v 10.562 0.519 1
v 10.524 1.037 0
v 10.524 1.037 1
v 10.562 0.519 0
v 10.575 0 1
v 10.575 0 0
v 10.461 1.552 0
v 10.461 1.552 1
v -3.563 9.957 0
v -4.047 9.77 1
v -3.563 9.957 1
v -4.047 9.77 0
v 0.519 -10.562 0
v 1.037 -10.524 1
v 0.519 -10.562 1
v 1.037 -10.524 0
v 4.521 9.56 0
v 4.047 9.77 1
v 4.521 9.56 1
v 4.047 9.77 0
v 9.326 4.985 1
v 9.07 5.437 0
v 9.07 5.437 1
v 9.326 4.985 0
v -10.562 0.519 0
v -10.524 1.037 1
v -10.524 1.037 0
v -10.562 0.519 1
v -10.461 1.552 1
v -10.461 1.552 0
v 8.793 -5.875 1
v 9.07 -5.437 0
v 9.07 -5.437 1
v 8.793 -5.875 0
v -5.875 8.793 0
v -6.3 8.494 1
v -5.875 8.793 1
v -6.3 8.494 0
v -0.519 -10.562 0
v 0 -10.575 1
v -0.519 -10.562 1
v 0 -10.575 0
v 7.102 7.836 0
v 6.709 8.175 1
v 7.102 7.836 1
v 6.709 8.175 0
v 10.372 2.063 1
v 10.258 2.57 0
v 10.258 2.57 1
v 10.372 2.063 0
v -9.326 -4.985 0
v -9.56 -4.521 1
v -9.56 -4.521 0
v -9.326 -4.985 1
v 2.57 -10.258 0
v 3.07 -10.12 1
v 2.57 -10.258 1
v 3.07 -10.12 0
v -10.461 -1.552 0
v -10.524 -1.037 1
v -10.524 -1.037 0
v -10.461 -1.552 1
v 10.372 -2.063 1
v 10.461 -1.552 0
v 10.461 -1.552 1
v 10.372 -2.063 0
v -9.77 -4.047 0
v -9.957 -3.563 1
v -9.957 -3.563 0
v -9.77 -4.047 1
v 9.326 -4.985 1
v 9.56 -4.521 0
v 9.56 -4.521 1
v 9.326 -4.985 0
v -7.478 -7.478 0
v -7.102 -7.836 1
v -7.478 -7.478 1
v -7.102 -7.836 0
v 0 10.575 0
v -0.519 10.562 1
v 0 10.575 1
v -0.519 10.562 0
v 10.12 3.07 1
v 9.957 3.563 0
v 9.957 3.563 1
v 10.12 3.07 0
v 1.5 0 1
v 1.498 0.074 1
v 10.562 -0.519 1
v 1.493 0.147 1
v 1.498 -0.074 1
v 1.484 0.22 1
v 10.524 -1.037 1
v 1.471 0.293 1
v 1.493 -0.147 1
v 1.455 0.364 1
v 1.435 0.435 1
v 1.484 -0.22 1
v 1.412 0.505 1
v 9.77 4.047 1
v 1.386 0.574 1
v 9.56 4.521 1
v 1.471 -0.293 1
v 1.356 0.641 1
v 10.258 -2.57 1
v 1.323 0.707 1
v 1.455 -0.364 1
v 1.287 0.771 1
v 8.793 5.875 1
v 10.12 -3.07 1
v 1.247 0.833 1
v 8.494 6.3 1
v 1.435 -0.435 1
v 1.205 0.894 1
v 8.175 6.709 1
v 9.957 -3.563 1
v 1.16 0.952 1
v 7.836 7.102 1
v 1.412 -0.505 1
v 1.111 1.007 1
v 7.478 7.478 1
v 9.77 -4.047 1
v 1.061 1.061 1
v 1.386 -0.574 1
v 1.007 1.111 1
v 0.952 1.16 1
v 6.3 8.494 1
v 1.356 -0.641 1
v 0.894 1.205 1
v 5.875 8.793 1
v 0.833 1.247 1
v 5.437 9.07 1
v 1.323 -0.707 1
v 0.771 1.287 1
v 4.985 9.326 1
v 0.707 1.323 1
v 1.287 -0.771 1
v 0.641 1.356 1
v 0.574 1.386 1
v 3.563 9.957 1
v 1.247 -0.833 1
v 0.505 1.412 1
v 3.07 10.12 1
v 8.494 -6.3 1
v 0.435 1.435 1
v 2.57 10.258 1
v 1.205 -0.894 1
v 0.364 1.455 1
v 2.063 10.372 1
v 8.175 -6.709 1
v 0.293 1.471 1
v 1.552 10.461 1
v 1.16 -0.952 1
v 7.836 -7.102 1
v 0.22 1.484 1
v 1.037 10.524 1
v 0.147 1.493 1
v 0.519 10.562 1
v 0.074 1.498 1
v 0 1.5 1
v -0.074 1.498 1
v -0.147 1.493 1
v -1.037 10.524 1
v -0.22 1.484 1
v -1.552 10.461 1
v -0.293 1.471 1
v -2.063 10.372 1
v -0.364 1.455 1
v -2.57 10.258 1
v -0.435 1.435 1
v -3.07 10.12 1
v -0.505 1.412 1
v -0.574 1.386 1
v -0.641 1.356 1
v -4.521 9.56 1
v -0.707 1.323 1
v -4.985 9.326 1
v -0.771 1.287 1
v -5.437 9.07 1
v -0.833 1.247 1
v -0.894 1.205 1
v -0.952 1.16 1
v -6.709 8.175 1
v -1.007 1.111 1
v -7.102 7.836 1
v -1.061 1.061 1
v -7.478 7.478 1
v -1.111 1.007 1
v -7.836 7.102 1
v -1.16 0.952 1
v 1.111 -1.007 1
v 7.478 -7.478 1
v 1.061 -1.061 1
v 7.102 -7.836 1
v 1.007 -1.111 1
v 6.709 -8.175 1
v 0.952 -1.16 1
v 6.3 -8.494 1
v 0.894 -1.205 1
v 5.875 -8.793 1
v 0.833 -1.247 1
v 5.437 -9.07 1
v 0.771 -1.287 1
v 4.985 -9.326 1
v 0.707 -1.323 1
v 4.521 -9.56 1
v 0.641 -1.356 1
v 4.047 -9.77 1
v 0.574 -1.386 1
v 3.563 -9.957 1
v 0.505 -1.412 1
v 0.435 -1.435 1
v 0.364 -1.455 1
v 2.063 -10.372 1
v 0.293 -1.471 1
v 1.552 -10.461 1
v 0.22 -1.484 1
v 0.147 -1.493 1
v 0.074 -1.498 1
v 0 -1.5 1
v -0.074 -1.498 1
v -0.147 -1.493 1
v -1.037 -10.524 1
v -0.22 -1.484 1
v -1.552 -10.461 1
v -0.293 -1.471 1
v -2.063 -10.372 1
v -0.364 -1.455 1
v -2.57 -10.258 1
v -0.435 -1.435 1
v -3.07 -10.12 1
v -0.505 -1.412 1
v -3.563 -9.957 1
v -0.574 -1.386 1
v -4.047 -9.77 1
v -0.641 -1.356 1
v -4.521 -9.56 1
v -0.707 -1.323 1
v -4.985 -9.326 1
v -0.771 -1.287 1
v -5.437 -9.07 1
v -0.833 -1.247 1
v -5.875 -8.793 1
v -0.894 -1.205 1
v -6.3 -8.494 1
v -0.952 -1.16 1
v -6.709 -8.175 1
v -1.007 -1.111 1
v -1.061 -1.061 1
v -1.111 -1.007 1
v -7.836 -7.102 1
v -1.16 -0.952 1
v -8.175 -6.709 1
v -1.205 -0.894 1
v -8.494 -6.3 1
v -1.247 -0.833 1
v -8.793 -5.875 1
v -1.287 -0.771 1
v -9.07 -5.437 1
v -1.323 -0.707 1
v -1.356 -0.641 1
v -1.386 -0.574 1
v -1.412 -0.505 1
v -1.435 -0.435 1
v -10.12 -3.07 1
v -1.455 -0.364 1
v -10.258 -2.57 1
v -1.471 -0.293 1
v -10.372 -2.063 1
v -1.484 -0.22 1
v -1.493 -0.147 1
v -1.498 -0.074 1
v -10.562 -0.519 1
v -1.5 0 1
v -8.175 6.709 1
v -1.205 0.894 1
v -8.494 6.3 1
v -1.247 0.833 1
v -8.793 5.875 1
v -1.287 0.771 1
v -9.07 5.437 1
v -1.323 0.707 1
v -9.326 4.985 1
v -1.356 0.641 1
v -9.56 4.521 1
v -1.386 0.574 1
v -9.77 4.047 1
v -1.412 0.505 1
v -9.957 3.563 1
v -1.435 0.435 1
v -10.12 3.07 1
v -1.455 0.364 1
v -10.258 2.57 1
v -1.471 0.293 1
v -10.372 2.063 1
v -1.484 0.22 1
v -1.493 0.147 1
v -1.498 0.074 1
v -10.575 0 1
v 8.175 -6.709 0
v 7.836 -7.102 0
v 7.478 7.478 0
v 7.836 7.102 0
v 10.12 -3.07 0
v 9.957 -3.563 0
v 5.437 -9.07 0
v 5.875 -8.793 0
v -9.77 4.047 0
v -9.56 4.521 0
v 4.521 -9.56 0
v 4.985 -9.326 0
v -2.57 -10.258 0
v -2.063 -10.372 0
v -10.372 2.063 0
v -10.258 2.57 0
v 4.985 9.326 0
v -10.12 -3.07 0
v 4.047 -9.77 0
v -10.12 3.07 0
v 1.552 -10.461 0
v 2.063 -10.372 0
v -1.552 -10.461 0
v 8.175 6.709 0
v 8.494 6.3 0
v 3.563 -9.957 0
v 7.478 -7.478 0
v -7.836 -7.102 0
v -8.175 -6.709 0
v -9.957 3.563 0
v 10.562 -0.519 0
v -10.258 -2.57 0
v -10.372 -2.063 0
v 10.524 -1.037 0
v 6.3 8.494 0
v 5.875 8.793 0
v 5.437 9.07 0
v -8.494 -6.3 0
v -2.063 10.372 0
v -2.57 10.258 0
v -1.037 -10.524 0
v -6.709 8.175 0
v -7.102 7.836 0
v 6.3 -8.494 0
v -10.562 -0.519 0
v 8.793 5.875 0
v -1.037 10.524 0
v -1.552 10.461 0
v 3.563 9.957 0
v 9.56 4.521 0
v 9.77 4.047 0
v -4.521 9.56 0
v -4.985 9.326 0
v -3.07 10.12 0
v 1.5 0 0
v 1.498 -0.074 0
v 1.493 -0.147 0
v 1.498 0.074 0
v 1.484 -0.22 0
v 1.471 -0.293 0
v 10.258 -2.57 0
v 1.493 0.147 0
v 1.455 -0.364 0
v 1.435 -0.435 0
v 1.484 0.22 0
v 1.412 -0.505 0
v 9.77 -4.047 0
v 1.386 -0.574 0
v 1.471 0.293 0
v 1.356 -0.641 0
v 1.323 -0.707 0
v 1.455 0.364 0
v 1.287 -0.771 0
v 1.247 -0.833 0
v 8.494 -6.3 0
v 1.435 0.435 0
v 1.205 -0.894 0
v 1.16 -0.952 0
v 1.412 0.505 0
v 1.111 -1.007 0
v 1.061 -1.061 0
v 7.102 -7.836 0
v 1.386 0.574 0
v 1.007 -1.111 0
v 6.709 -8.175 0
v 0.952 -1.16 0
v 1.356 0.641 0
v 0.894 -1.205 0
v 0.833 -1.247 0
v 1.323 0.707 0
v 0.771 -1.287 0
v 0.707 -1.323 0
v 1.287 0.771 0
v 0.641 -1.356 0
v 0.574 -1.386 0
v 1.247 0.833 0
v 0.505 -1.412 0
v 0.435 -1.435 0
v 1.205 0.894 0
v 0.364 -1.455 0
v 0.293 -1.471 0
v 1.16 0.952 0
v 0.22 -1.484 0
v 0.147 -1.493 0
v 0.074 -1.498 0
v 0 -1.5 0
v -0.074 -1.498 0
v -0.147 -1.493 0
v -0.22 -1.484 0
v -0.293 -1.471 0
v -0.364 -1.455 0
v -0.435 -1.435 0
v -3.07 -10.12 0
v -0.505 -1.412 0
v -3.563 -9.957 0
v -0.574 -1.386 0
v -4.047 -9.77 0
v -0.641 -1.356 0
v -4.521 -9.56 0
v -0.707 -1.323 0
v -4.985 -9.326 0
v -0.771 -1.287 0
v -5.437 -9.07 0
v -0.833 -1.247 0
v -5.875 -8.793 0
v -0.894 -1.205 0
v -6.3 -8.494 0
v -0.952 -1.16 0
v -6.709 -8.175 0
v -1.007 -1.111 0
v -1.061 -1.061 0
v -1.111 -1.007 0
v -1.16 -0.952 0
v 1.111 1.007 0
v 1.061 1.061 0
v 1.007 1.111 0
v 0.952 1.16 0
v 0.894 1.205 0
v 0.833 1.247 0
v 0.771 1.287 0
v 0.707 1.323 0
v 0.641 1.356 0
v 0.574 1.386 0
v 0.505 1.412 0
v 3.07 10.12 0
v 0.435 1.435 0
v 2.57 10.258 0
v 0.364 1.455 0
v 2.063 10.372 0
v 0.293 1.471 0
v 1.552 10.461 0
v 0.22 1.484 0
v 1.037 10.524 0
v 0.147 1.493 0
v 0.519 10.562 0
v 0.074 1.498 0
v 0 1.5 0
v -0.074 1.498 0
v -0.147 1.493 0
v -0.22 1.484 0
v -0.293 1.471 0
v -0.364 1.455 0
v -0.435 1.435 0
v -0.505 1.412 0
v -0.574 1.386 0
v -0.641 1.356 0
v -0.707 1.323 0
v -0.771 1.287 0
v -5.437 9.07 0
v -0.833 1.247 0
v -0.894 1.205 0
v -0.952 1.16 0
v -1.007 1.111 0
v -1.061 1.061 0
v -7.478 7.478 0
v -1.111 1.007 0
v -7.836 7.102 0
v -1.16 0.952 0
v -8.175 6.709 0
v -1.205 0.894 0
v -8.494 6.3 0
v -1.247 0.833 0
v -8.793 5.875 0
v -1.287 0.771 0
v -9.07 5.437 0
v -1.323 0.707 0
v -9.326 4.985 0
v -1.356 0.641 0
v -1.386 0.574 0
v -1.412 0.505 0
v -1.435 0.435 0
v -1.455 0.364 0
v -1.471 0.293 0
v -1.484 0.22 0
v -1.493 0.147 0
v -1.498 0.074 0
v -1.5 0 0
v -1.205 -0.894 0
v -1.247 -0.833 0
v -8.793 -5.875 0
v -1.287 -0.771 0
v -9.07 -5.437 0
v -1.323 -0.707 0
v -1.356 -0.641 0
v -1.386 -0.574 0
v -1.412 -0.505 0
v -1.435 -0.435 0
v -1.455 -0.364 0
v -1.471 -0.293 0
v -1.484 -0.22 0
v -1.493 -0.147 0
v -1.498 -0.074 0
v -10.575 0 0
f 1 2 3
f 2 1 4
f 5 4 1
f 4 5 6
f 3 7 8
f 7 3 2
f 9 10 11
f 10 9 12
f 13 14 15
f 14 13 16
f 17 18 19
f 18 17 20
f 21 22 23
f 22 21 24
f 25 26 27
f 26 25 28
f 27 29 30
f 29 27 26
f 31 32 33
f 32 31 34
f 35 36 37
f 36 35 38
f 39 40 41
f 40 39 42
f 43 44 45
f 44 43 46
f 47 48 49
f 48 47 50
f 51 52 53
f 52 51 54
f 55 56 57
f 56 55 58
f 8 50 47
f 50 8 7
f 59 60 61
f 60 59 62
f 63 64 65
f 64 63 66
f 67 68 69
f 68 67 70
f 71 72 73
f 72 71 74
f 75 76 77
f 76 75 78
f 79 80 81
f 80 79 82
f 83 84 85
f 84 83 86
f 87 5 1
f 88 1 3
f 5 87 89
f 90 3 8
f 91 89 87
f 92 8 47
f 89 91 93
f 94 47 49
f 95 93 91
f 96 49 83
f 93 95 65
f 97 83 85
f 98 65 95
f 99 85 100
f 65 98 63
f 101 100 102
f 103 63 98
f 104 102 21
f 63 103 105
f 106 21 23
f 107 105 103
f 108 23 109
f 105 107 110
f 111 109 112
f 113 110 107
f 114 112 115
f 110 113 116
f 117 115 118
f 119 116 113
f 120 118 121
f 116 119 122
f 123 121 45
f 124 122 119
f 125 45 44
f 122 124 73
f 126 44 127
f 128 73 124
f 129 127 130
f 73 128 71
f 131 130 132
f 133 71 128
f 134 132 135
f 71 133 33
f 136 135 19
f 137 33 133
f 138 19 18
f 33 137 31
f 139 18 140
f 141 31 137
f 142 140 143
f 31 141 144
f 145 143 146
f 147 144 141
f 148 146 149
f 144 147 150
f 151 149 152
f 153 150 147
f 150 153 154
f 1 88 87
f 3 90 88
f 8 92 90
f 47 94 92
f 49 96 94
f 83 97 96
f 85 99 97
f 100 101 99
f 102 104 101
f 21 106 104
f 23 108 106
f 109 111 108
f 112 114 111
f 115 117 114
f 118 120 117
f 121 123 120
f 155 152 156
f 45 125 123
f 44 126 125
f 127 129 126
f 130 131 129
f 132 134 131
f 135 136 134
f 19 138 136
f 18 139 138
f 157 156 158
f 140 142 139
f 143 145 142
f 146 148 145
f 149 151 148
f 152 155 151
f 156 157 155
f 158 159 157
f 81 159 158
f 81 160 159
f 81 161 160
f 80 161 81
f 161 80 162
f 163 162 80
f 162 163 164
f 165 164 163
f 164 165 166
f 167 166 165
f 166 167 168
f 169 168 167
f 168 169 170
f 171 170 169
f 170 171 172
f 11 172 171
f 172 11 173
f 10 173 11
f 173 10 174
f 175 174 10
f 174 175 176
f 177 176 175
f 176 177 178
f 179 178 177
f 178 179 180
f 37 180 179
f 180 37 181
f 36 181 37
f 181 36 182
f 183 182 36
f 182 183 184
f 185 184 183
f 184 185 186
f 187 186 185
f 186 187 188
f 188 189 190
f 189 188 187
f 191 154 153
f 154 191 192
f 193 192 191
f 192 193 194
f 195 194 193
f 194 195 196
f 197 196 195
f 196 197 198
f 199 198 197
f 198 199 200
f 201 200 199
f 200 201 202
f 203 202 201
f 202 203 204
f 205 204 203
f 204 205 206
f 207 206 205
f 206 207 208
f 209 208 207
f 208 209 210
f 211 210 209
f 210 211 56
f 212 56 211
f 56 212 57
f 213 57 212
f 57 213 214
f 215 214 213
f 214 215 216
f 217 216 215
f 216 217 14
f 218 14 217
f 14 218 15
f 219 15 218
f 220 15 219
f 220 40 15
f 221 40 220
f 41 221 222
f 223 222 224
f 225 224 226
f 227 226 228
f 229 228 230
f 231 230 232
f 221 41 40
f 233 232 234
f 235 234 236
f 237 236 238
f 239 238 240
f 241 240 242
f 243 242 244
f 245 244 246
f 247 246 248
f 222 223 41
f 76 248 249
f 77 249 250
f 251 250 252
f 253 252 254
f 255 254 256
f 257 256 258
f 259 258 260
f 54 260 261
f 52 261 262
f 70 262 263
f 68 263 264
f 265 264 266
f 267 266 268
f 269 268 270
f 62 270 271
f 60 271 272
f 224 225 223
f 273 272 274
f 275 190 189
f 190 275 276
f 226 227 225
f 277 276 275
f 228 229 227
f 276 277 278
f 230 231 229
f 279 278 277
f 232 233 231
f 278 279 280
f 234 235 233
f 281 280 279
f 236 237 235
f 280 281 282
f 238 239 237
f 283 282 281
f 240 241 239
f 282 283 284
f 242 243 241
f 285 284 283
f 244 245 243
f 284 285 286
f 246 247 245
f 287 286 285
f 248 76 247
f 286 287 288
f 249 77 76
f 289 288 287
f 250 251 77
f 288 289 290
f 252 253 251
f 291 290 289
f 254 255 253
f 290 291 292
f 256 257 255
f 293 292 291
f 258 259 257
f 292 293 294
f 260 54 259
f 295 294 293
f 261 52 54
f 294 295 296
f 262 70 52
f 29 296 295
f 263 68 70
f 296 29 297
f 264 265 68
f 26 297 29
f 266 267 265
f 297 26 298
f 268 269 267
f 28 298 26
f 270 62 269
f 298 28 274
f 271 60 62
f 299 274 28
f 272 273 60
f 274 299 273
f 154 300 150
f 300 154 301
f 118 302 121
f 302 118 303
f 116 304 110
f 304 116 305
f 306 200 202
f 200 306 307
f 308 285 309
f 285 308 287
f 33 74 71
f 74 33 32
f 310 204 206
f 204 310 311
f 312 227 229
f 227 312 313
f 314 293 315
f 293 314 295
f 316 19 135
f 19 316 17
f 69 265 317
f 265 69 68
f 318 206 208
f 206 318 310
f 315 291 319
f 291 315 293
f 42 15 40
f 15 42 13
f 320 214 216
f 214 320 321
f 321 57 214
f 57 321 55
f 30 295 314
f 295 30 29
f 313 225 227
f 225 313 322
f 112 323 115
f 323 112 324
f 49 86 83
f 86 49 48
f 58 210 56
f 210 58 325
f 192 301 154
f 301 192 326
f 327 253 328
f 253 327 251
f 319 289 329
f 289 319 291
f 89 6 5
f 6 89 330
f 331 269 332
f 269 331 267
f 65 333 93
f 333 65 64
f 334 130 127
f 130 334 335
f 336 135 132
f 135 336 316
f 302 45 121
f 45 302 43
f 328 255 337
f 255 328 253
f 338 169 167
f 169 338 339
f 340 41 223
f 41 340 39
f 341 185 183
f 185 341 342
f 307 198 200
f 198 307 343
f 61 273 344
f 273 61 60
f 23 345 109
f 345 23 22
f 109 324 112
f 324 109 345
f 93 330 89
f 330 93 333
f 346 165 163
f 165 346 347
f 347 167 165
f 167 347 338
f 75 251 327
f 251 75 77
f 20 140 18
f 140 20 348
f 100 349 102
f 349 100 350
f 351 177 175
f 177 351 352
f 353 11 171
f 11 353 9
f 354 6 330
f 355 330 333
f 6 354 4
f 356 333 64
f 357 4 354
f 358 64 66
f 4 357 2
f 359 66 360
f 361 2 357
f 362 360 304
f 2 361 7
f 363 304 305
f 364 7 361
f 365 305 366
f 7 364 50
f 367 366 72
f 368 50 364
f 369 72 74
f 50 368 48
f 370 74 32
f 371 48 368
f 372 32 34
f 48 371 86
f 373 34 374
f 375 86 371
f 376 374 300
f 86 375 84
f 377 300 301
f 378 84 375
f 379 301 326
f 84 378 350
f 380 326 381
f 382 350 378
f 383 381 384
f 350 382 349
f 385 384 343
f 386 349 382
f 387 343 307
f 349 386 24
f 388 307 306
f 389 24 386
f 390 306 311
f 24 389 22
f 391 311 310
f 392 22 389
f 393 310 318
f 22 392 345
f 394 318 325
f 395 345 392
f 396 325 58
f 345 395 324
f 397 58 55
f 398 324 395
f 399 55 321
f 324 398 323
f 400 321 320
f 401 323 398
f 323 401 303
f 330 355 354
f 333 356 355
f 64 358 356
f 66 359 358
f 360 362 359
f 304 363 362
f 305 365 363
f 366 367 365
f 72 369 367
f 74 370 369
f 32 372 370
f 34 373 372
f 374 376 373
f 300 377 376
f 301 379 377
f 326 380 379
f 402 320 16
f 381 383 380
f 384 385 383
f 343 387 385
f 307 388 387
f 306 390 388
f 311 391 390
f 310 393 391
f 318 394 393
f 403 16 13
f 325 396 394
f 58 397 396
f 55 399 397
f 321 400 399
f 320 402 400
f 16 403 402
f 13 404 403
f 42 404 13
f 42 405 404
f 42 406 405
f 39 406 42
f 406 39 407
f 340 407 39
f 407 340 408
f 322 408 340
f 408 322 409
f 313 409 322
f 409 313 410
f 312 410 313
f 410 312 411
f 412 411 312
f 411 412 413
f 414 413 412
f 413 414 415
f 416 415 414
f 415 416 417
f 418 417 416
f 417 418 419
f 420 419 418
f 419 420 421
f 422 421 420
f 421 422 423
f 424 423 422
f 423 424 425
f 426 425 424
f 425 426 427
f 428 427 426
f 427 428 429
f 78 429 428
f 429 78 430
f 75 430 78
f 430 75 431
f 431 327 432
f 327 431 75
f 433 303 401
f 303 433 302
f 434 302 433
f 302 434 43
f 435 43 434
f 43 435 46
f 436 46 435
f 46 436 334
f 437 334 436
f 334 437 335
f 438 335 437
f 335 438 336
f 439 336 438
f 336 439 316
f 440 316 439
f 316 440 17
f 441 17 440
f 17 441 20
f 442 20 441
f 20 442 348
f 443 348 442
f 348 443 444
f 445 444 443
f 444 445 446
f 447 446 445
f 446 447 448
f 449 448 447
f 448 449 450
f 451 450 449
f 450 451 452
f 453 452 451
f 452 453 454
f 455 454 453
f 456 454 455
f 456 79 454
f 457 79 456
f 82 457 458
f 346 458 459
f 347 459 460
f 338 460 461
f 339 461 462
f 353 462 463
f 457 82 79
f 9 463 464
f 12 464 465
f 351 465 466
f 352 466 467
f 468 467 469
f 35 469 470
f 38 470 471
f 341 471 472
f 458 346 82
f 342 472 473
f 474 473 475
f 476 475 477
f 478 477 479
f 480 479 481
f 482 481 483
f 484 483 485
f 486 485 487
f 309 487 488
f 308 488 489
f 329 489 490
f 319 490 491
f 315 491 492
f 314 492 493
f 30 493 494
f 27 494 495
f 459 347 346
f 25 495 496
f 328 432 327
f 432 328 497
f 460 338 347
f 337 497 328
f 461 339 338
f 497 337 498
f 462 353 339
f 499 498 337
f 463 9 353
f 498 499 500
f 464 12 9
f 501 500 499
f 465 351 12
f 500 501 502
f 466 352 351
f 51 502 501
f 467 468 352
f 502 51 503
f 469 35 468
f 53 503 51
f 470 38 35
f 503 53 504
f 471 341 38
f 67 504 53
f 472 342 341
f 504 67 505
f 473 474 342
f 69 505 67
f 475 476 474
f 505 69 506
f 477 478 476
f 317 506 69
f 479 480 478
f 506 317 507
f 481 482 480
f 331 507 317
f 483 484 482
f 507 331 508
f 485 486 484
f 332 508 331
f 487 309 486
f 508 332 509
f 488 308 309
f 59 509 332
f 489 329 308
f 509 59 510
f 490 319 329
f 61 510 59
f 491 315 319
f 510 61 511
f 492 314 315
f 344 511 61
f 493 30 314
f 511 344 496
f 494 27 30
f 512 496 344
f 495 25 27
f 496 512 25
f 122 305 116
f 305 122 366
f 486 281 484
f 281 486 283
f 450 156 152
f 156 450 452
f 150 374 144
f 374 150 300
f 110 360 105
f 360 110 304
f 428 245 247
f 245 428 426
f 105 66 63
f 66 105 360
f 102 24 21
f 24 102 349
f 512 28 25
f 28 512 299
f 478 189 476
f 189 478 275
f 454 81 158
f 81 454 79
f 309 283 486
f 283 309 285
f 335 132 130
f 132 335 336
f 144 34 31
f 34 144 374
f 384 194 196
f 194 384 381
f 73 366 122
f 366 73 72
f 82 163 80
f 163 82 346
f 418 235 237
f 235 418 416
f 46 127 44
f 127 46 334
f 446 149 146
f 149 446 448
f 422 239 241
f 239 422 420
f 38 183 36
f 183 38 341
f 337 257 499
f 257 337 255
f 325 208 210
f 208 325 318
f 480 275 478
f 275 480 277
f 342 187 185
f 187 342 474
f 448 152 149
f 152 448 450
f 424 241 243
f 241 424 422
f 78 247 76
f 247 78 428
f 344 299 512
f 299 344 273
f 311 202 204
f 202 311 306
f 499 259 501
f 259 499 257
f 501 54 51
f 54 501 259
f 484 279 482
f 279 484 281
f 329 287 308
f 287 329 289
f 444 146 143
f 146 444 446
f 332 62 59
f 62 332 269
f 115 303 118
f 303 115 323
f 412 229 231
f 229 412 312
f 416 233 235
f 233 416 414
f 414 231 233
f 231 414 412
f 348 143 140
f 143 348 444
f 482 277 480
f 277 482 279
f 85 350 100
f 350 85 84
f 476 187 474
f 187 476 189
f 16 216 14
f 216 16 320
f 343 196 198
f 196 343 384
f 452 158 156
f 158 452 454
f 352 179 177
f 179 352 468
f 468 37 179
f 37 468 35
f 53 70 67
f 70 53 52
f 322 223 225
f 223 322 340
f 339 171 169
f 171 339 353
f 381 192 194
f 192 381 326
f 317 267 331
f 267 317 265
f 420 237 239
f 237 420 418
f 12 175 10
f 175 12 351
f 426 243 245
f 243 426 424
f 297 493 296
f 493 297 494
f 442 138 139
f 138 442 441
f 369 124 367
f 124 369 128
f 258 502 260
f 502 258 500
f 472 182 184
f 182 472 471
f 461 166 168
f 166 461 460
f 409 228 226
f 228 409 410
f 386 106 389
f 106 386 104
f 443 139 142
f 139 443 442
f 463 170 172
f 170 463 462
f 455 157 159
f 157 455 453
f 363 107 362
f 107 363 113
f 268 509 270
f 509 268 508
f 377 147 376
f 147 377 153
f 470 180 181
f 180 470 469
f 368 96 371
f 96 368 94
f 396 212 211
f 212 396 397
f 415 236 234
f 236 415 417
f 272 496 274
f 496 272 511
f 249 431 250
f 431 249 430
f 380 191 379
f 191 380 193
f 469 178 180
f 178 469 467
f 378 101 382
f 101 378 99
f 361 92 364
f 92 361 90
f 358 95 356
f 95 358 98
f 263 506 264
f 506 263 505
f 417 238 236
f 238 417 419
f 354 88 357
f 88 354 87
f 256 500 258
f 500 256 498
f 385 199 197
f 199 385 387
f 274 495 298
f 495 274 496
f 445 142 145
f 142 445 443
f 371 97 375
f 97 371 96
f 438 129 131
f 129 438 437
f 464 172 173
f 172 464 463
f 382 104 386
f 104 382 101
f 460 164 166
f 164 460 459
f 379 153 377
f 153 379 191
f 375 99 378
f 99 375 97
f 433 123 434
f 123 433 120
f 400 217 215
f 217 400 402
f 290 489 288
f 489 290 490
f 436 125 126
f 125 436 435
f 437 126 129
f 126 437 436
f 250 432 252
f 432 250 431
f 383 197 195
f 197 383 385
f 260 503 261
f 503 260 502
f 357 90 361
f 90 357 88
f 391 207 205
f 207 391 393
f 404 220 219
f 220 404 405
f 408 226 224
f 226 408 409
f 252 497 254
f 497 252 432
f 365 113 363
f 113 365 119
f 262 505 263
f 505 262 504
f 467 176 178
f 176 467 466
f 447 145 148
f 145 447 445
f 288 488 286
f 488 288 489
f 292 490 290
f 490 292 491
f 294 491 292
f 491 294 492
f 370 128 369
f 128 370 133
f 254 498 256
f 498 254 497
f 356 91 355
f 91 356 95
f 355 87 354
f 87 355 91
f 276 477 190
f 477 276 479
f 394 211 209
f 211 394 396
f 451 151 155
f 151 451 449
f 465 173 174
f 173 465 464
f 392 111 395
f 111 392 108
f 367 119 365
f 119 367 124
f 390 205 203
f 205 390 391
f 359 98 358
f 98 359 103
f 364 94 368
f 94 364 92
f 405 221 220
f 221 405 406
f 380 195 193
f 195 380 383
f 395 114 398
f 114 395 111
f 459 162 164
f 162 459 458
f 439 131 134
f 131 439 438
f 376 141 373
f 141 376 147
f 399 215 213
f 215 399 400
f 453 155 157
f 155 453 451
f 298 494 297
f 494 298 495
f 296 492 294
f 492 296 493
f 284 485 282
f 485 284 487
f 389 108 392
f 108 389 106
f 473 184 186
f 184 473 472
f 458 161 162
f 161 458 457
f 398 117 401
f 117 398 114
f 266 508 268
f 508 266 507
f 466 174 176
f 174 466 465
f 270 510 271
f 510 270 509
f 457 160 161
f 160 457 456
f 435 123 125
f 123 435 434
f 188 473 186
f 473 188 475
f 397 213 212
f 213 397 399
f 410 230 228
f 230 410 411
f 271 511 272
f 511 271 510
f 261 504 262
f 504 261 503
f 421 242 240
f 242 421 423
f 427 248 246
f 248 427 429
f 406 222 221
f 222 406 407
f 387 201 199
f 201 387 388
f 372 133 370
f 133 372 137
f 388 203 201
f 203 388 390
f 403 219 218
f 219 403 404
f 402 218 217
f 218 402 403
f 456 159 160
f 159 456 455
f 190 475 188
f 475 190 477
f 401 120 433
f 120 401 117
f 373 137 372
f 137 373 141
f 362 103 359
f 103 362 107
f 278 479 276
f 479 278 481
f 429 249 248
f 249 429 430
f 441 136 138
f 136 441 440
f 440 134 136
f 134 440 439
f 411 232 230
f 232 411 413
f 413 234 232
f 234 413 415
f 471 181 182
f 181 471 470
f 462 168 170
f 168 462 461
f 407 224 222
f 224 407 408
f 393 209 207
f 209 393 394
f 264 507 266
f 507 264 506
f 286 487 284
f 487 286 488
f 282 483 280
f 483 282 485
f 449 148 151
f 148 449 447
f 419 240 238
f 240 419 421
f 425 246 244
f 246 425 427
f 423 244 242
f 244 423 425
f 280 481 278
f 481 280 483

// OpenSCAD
fn = 128;
shim = 0.3;
radius = (21.45 - shim) / 2;
thickness = 1.0;
aperture_radius = 1.5;

module render()
{
  difference() {
    cylinder(h = thickness,
             r1 = radius,
             r2 = radius, $fn=fn);
    cylinder(h = thickness,
             r1 = aperture_radius,
             r2 = aperture_radius, $fn=fn);
  }
}

echo(version=version());

render();
